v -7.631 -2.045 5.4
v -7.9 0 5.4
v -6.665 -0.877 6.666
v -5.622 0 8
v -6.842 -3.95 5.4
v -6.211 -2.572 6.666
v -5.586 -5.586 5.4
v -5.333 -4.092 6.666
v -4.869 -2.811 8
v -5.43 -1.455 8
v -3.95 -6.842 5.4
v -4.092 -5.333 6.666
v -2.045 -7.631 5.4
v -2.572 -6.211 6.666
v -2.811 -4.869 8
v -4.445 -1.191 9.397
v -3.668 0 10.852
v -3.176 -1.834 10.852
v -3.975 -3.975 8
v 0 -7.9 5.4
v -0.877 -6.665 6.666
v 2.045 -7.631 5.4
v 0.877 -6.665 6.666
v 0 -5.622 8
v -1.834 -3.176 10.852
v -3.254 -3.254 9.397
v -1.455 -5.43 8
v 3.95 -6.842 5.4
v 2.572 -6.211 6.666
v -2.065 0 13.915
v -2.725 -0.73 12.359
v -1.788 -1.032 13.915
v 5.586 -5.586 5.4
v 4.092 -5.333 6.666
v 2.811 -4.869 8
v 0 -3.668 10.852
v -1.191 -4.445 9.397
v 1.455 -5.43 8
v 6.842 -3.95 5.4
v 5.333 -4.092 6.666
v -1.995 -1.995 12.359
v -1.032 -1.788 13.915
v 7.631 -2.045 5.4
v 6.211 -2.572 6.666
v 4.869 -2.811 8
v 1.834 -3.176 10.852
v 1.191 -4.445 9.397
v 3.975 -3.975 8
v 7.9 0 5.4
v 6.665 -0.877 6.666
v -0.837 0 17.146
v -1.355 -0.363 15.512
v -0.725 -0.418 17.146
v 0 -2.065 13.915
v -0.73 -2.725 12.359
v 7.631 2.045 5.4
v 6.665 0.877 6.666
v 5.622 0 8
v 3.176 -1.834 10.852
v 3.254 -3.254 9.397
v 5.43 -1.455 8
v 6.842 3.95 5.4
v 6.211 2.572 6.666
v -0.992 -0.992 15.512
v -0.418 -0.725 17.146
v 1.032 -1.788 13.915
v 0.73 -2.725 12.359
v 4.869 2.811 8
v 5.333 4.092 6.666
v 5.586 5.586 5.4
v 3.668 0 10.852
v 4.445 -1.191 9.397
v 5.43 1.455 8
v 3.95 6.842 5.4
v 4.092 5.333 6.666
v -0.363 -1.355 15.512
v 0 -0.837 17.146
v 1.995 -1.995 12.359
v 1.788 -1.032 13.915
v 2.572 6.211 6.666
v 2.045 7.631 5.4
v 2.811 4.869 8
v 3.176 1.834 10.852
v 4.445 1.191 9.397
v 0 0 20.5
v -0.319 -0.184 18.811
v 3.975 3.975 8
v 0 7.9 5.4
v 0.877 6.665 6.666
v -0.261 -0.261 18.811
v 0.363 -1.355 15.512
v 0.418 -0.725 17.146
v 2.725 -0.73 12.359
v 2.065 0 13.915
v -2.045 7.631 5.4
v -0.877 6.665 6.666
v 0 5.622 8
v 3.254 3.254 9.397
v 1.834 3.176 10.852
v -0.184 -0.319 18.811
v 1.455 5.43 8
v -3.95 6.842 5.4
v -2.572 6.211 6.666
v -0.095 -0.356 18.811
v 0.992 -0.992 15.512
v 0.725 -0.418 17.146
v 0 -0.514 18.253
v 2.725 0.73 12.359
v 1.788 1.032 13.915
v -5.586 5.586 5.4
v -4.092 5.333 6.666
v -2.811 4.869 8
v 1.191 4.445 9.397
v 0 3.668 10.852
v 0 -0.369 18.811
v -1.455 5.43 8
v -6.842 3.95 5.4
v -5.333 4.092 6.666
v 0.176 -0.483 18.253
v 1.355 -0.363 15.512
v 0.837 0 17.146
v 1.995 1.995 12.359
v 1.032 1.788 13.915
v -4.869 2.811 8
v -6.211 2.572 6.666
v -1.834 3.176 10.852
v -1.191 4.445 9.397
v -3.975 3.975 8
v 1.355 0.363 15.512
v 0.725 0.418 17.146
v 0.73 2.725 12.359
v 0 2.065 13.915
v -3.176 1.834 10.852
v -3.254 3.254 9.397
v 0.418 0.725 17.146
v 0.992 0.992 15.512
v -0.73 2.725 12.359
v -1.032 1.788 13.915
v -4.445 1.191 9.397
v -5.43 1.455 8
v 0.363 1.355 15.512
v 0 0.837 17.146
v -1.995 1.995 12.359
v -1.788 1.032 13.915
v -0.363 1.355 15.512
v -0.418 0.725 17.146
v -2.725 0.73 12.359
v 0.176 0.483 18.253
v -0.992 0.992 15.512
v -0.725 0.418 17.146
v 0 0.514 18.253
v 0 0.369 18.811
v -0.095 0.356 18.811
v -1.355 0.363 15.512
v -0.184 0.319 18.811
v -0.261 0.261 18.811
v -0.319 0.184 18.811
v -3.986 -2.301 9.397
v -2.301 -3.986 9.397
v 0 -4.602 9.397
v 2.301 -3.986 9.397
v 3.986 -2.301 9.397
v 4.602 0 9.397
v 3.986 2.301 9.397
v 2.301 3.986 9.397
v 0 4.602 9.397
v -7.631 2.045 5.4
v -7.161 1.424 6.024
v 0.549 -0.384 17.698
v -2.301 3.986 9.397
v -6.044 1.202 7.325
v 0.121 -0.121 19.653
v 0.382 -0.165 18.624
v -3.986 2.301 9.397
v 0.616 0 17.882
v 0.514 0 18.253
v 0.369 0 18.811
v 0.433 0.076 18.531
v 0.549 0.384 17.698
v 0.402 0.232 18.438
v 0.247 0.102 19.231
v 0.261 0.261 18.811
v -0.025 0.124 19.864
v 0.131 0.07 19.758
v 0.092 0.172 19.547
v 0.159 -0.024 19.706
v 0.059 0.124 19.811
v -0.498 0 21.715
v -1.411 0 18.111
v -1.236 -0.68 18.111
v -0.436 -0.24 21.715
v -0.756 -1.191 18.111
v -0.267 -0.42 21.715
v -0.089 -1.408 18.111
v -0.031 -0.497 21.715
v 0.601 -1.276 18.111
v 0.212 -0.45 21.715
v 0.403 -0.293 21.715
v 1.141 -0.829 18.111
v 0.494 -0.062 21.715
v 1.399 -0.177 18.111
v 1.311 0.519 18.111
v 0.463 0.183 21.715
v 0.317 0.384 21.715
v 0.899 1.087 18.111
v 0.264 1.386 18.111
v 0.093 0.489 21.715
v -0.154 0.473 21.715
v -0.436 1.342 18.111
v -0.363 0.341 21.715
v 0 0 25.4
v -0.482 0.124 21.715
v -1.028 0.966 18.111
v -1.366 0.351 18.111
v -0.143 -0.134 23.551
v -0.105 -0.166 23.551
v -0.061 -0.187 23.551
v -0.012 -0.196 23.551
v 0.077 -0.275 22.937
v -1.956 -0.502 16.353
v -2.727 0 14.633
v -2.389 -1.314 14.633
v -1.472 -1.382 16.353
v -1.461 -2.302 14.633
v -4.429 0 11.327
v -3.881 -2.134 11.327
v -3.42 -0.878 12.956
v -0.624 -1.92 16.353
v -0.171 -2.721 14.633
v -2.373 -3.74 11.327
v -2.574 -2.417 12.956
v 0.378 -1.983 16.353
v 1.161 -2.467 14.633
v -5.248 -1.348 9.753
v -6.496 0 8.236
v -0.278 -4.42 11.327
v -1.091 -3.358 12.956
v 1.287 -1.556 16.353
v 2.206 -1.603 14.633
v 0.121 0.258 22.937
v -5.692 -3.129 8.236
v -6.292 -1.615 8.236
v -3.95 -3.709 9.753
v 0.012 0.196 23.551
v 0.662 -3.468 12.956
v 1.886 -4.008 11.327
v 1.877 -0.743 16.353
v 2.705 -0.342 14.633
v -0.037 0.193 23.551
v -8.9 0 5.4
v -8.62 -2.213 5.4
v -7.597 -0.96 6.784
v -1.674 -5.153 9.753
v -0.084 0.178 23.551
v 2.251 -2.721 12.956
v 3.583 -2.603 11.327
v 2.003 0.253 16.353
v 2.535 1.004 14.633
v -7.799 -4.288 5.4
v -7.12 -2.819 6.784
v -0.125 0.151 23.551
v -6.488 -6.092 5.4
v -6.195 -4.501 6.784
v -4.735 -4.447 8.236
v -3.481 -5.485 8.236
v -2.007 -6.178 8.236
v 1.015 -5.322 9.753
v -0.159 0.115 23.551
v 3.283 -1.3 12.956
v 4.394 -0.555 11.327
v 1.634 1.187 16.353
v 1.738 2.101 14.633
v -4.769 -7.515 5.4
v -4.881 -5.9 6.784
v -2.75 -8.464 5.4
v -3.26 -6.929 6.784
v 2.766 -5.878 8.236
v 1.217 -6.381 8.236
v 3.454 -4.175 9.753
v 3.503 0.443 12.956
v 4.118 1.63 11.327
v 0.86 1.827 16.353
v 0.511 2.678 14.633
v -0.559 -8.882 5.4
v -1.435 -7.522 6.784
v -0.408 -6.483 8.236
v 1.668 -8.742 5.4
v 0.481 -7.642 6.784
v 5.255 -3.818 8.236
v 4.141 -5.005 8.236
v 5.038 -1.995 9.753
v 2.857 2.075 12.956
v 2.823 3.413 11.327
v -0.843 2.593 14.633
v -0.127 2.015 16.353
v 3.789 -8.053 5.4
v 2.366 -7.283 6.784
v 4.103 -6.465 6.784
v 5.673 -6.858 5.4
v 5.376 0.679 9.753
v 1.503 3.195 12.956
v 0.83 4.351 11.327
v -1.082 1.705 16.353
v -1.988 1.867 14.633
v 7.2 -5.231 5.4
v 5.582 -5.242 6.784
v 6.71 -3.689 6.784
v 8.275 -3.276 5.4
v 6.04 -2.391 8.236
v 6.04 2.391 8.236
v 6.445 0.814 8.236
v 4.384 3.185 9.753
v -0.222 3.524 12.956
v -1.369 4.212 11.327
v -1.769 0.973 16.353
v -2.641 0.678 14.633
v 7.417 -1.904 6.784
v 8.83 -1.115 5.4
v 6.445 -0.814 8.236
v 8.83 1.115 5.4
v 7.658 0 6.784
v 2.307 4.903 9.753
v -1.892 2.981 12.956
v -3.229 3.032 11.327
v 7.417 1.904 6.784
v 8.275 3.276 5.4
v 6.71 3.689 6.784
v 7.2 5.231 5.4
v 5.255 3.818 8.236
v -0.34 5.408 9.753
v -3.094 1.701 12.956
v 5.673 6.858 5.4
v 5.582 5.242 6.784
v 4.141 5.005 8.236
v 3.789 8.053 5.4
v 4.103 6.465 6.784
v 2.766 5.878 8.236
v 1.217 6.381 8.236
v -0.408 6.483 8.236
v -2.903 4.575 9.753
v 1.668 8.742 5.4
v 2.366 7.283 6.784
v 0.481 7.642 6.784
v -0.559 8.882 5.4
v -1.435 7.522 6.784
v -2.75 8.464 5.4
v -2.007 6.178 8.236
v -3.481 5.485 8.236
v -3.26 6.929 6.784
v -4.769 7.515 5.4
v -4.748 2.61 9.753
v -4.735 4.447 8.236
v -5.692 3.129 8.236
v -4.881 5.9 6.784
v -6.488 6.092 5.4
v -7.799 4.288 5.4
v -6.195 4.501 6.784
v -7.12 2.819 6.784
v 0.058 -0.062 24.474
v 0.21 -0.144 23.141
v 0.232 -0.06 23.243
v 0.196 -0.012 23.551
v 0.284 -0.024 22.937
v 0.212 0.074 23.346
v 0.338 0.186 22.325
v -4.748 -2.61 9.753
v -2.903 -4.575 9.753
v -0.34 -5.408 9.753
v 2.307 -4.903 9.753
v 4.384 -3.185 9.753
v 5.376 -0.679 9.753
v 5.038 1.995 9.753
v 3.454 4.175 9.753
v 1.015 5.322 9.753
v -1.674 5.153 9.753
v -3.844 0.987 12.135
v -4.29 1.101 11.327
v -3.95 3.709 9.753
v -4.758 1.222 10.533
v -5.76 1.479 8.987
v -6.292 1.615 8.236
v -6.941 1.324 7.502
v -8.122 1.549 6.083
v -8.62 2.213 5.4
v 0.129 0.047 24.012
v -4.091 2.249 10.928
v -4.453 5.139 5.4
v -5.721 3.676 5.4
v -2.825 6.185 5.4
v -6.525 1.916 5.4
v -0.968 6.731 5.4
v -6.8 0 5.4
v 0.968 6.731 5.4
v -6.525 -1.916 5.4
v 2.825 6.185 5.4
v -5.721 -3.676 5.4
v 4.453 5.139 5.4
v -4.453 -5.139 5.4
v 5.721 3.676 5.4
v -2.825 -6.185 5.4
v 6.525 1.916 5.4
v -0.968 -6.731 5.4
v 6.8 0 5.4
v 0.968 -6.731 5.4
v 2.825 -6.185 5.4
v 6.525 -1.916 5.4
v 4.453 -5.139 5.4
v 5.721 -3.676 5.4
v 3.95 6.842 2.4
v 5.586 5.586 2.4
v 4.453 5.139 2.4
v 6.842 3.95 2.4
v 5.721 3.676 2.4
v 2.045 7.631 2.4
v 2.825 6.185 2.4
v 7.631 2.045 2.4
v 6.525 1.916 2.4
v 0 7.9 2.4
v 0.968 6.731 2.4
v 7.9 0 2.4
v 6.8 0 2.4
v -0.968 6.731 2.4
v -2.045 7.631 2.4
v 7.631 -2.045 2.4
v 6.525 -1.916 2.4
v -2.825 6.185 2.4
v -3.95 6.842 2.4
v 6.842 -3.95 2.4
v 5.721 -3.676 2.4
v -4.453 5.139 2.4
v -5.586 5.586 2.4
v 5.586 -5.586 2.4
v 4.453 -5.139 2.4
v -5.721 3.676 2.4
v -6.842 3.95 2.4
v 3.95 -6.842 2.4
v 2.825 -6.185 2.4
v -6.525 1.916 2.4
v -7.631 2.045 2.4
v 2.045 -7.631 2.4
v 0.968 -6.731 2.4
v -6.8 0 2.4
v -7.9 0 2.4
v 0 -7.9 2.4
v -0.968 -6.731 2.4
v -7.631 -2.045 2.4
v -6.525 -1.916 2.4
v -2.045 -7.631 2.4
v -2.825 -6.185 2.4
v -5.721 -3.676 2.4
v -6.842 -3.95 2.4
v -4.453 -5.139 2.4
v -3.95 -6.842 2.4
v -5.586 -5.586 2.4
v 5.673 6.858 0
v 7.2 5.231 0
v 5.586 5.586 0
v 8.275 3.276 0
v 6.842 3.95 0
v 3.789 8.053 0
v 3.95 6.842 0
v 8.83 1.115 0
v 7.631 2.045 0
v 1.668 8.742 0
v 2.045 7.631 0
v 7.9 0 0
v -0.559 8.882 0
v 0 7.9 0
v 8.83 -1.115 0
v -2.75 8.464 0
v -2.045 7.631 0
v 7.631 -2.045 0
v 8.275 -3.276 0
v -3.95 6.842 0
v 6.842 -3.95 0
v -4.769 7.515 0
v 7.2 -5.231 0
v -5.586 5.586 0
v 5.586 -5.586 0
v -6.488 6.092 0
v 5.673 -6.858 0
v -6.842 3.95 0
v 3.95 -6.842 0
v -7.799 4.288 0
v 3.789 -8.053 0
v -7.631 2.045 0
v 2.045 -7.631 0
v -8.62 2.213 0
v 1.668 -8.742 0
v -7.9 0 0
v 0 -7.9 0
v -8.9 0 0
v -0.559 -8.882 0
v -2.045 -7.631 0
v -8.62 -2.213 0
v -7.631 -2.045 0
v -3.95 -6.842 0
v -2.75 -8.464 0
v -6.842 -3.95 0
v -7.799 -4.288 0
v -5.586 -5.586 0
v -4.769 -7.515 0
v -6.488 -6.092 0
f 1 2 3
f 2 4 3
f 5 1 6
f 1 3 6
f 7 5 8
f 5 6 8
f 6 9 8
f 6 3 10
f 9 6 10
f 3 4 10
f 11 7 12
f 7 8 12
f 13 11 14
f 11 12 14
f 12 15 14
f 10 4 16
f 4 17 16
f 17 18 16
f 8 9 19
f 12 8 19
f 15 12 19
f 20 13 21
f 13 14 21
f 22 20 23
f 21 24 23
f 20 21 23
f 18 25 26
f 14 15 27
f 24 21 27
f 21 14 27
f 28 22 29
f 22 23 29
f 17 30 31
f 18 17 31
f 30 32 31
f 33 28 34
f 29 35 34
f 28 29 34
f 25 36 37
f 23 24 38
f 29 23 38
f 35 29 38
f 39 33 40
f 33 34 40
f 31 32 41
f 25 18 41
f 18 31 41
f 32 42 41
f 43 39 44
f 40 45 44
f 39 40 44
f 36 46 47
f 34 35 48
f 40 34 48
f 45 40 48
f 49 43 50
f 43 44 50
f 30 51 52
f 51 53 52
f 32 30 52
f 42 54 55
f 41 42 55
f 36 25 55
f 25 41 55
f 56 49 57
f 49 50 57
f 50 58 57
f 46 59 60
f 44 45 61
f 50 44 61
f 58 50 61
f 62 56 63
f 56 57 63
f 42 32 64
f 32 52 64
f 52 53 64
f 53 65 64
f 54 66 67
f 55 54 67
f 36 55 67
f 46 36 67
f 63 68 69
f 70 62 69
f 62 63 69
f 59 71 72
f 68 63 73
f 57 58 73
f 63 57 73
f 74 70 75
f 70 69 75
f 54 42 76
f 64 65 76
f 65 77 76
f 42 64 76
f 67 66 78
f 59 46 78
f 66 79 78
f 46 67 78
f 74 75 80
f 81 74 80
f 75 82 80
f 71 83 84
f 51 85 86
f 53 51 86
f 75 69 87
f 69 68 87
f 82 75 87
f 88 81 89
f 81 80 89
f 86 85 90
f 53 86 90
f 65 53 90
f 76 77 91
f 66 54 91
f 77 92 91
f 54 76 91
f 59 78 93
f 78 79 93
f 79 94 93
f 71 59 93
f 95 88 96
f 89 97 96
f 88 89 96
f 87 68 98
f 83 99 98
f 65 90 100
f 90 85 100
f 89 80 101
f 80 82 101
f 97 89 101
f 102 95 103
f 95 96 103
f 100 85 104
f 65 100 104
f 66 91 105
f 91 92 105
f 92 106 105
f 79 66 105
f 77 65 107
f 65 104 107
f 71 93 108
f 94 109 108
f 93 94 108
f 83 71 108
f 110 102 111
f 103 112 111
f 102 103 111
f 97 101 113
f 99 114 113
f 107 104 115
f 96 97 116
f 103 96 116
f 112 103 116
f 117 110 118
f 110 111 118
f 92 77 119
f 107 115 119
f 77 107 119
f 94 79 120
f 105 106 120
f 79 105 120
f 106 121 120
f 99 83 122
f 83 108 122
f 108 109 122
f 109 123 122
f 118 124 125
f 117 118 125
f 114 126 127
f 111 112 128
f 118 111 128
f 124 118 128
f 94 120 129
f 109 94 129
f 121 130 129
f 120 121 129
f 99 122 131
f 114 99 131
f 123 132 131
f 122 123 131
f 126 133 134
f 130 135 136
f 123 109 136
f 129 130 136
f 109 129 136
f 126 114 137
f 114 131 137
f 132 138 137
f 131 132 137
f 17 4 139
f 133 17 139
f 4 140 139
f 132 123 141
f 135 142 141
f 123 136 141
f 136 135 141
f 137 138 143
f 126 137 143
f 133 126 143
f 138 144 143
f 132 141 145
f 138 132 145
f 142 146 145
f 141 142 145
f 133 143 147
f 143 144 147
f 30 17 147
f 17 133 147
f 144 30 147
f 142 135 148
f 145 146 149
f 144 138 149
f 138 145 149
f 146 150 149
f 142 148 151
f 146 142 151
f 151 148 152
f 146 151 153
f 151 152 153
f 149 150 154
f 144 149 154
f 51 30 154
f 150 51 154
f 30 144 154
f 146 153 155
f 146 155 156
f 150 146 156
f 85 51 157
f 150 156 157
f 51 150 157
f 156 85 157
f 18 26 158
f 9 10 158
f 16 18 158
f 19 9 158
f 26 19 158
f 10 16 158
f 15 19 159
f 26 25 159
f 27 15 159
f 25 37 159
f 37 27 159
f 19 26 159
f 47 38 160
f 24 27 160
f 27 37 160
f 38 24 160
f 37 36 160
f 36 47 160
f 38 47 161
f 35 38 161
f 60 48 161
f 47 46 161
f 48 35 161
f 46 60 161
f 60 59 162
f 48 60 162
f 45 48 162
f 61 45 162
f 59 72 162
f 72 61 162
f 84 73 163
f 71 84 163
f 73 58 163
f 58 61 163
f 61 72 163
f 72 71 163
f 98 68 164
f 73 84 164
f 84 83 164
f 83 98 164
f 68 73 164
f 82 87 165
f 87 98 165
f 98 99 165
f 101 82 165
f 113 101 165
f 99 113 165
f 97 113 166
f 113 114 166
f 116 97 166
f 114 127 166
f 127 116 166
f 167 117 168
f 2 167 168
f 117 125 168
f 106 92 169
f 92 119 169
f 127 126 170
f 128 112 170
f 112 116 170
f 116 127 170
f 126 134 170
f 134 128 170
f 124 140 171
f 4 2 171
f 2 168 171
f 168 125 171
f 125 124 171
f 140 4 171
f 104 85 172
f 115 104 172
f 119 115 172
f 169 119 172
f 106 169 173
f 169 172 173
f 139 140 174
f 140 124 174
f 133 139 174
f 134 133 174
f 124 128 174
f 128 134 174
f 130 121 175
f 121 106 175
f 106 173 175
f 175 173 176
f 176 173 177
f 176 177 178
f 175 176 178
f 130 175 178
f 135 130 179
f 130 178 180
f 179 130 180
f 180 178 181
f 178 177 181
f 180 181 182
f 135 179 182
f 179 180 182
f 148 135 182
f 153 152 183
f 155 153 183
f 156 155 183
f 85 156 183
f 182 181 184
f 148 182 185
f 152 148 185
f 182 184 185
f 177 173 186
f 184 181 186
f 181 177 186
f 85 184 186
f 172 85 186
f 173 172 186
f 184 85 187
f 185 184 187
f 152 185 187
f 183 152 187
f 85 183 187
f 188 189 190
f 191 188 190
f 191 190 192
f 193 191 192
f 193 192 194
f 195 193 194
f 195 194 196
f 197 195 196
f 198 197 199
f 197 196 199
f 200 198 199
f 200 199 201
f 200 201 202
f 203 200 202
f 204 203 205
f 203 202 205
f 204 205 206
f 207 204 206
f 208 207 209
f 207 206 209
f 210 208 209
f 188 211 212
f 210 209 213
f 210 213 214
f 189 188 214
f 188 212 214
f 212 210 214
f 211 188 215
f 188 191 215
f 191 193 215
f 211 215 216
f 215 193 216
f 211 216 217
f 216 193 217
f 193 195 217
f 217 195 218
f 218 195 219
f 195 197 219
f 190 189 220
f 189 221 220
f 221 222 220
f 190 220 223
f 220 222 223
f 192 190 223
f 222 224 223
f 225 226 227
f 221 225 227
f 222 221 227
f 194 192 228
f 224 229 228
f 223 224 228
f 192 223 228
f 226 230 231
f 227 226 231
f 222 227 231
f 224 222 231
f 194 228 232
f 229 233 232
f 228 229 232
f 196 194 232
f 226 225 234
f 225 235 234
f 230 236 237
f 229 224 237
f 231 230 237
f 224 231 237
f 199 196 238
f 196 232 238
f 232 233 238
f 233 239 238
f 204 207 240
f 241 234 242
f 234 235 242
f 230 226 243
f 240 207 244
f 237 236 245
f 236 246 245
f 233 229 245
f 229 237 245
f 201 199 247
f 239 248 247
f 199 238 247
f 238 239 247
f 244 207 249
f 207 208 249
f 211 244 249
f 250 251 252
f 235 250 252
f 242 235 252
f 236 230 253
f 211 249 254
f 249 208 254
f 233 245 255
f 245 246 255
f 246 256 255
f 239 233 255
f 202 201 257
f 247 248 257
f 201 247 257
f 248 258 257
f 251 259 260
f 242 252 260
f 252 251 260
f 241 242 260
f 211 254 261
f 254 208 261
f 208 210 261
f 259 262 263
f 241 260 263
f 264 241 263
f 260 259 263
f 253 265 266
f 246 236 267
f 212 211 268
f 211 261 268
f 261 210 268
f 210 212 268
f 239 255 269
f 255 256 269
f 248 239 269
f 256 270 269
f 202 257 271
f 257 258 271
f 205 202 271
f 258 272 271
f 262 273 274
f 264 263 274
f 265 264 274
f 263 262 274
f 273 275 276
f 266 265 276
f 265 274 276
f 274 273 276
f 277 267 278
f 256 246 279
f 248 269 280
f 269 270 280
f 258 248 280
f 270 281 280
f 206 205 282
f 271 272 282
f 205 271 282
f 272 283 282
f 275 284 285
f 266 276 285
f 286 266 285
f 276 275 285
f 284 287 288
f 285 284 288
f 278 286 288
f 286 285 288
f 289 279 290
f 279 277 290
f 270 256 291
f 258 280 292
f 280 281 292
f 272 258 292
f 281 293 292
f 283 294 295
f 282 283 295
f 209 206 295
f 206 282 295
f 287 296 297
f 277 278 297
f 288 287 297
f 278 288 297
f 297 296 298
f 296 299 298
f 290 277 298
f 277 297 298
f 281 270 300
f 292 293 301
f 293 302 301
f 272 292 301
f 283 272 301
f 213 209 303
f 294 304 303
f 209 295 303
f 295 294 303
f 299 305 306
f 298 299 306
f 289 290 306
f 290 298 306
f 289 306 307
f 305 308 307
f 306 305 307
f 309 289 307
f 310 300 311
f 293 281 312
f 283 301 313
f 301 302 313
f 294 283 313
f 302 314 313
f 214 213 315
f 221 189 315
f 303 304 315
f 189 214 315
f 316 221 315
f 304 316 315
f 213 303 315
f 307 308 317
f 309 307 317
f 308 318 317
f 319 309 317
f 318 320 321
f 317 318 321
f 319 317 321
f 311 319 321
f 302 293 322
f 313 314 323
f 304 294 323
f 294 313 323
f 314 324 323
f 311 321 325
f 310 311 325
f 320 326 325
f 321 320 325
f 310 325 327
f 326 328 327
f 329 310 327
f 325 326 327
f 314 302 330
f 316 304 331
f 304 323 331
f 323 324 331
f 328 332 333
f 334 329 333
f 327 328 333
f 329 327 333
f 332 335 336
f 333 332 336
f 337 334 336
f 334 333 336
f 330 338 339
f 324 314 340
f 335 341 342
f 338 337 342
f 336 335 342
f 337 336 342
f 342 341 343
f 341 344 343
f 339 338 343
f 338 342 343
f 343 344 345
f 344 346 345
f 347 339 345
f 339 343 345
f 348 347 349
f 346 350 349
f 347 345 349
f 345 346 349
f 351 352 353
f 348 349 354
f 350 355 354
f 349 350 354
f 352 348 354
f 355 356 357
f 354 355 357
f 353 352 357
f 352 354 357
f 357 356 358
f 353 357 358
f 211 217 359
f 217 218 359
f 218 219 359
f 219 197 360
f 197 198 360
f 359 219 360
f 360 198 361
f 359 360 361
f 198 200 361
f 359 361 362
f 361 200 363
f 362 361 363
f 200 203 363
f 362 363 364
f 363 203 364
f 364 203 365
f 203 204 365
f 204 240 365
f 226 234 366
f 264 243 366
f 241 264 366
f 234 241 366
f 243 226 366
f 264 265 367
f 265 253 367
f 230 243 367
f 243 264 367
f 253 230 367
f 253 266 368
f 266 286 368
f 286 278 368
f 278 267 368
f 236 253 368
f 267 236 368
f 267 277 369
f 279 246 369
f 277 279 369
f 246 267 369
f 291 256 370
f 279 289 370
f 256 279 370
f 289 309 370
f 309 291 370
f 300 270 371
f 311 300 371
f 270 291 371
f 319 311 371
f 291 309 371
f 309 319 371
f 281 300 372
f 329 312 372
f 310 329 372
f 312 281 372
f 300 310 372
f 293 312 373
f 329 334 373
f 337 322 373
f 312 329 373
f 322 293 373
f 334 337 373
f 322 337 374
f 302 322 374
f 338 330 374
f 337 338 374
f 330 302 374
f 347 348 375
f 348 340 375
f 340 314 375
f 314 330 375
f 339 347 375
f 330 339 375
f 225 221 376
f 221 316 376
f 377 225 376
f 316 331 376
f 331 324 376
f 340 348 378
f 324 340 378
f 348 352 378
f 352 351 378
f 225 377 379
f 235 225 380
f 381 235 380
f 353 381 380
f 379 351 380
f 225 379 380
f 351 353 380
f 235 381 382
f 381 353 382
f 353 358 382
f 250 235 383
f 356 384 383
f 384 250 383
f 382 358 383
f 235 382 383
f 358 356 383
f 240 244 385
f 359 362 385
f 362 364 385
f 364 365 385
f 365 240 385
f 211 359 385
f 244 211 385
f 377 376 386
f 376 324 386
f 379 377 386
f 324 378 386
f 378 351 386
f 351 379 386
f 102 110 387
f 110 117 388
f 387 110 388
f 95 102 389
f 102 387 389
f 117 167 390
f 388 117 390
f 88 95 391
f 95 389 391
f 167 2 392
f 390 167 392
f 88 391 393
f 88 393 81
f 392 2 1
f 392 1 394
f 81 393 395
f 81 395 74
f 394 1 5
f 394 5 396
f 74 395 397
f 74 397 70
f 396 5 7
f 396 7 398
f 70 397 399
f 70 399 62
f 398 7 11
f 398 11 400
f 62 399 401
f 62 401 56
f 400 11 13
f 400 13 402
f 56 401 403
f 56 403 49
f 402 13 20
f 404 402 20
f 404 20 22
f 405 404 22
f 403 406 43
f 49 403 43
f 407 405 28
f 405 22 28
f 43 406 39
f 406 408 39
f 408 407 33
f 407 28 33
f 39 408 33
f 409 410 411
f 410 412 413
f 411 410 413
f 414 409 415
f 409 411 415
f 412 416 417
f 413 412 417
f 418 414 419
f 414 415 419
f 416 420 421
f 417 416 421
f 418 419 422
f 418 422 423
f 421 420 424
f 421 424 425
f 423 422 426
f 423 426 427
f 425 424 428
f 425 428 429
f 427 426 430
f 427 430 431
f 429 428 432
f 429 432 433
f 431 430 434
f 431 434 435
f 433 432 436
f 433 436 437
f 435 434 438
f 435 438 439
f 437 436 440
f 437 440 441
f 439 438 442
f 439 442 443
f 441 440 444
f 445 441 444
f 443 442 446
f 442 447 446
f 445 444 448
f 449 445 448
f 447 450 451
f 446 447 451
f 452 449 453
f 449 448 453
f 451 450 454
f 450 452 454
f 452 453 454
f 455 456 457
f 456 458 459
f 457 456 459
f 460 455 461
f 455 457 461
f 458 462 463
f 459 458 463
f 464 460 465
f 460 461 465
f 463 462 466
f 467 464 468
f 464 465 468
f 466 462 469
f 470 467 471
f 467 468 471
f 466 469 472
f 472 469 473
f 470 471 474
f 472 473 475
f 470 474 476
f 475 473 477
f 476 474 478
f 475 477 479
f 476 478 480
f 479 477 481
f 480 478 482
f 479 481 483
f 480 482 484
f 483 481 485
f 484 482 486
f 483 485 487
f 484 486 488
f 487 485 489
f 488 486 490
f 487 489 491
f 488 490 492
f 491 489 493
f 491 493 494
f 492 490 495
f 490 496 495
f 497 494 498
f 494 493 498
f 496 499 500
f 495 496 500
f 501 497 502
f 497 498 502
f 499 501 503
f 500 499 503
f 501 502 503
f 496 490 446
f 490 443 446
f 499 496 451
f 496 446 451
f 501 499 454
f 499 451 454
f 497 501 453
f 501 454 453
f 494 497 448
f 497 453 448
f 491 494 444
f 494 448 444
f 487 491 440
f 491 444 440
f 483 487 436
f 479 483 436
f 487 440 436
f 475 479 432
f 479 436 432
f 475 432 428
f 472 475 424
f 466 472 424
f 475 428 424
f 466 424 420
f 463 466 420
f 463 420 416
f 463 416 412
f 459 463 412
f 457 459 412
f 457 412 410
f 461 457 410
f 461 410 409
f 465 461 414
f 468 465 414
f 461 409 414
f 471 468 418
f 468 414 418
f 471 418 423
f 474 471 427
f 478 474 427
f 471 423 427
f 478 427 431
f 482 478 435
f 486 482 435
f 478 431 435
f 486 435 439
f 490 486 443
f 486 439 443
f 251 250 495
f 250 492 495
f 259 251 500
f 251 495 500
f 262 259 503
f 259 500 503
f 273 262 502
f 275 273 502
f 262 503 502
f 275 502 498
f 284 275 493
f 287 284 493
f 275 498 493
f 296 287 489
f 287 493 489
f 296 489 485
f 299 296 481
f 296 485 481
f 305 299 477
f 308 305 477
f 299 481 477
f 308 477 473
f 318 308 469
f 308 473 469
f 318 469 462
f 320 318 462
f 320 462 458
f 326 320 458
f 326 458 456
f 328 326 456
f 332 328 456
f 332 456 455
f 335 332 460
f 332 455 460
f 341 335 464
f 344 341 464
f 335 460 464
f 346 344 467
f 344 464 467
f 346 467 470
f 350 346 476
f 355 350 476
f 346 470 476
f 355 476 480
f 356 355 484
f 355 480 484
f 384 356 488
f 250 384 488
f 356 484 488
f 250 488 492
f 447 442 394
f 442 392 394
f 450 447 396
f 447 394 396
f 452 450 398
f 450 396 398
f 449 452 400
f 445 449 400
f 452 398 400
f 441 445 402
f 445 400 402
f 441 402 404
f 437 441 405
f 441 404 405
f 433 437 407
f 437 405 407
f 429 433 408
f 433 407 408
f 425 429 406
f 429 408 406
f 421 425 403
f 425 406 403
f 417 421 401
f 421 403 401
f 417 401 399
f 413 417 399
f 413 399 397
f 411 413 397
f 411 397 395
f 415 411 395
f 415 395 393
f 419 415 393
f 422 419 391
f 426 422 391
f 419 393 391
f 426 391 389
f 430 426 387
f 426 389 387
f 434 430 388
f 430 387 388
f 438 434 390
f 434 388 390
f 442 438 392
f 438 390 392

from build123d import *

# Parameters (mm, degrees)
F3_ANGLE = 90


with BuildPart() as f1:
    # F0 (on Front) → F1 (revolve)
    with BuildSketch(Plane.XZ):
        with BuildLine():
            Line((0, 8.9), (0, 7.9))
            Line((0, 7.9), (2.4, 7.9))
            Line((2.4, 7.9), (2.4, 6.8))
            Line((2.4, 6.8), (5.4, 6.8))
            Line((5.4, 6.8), (5.4, 7.9))
            ThreePointArc((5.4, 7.9), (12.3593291438, 2.820751862), (20.5002371222, 0))
            Line((20.5002371222, 0), (25.4, 0))
            ThreePointArc((25.4, 0), (14.6331199029, 2.7266739391), (5.4, 8.9))
            Line((5.4, 8.9), (0, 8.9))
        make_face()
    revolve(axis=Axis((12.5827532146, 0, 0), (1, 0, 0)))


with BuildPart() as f1_1:
    # F3: moved
    add(f1.part.rotate(Axis((0, 0, 0), (0, -1, 0)), F3_ANGLE))


solid = f1_1.part
